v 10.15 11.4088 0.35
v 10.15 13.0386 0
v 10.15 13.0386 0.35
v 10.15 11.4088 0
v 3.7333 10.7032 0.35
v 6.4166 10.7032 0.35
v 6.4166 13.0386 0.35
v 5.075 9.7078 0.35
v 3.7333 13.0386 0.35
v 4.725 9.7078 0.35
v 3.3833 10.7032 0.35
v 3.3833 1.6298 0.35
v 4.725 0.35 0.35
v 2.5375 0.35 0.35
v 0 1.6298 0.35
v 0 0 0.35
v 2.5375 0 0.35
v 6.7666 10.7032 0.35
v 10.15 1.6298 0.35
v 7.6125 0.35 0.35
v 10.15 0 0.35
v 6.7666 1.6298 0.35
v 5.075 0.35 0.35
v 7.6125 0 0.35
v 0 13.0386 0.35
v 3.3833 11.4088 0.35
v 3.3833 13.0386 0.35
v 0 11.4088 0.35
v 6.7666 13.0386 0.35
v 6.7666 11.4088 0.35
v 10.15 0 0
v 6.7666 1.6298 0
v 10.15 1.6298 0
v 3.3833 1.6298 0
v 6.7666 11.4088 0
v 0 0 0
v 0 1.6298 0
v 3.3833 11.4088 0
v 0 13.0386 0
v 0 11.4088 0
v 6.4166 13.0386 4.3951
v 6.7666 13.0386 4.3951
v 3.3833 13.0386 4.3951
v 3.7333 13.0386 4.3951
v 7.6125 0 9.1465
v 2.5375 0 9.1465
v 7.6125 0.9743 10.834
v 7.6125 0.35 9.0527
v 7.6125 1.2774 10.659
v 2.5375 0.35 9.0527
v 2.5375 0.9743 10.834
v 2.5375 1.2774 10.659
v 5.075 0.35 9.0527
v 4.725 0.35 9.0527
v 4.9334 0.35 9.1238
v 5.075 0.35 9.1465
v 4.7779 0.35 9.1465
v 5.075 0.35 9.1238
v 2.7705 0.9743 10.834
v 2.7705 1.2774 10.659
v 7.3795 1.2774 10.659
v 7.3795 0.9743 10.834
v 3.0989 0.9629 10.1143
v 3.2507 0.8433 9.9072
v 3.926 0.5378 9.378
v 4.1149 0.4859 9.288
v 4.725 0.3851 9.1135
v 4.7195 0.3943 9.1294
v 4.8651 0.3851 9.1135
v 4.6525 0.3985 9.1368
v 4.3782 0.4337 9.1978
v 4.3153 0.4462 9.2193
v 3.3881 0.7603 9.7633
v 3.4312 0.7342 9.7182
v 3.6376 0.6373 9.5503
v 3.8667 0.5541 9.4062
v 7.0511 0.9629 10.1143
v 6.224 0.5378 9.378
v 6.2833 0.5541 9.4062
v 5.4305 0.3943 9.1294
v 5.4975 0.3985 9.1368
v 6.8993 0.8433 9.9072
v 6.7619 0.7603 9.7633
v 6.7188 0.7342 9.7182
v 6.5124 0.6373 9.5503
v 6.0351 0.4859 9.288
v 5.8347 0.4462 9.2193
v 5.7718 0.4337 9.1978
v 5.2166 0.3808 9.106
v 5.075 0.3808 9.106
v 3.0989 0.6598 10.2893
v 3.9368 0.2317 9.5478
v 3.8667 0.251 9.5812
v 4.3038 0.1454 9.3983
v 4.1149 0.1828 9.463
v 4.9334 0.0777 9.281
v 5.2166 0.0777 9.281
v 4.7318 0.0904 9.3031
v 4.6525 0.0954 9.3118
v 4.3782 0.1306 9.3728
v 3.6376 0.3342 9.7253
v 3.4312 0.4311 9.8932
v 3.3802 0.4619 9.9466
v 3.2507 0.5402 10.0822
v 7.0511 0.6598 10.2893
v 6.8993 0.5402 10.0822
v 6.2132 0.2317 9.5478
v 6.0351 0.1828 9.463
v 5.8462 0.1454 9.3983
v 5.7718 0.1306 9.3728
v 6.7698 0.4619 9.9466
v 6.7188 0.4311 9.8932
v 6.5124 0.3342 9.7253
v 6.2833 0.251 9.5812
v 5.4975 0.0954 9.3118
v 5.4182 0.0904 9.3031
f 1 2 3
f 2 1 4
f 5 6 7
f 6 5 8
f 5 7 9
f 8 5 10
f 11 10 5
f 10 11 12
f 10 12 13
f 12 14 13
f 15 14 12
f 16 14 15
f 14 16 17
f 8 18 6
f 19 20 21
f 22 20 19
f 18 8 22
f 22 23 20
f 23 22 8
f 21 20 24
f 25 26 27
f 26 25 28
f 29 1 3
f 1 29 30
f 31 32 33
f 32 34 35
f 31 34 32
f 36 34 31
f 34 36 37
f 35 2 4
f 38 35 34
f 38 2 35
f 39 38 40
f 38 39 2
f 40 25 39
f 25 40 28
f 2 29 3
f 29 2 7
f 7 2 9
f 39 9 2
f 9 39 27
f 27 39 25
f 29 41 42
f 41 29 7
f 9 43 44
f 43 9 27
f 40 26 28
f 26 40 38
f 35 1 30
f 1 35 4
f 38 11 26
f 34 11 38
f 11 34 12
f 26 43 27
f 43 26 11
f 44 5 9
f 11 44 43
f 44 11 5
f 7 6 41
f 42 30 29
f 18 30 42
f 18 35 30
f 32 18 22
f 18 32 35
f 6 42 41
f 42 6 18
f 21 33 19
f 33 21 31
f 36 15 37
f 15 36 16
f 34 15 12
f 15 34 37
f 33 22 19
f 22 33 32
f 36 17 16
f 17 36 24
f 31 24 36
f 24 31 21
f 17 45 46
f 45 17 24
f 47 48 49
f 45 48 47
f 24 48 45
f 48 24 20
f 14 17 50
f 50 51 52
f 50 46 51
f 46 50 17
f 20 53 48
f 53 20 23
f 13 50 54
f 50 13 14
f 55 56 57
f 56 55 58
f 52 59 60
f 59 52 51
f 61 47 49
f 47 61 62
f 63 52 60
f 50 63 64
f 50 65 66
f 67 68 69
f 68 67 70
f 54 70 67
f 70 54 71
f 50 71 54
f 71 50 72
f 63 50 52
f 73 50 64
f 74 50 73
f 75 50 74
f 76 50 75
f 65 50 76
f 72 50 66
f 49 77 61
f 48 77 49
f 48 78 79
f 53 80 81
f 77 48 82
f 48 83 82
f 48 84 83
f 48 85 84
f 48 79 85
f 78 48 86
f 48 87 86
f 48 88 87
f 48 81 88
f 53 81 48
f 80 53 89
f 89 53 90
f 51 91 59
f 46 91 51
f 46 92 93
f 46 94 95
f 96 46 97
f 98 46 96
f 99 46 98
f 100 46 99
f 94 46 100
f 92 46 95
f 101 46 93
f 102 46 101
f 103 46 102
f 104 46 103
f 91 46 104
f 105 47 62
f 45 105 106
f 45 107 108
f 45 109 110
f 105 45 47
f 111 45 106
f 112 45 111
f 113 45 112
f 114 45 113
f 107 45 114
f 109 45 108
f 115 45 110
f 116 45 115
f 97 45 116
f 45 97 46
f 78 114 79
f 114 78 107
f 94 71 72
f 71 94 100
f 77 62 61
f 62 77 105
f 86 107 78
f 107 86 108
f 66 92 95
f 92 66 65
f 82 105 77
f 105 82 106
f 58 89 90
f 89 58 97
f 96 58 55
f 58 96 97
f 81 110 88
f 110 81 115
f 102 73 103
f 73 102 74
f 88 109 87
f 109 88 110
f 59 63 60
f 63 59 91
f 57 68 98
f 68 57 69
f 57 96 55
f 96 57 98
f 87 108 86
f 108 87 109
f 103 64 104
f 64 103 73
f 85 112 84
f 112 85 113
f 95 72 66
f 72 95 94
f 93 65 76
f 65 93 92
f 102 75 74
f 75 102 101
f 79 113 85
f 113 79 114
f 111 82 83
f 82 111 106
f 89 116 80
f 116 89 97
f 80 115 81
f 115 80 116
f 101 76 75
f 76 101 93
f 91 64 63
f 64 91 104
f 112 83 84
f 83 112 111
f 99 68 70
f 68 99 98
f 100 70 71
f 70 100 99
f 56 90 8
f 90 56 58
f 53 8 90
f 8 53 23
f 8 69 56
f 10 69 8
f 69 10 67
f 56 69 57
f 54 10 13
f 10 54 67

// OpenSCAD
$fn = 50;

union() {
    translate([3.3833, 0, 0]) {
        cube([3.3833, 13.0386, 0.35]);
    };
    union() {
        translate([0, 11.4088, 0]) {
            cube([10.15, 1.6298, 0.35]);
        };
        translate([3.3833, 13.0386, 0]) {
            rotate([180, 270, 0]) {
                linear_extrude(height=0.35) {
                    polygon([[0, 0], [4.395078924206, 0], [0, 2.5375]]);
                };
            };
        };
        translate([6.4166, 13.0386, 0]) {
            rotate([180, 270, 0]) {
                linear_extrude(height=0.35) {
                    polygon([[0, 0], [4.395078924206, 0], [0, 2.5375]]);
                };
            };
        };
    };
    difference() {
        union() {
            cube([10.15, 1.6298, 0.35]);
            translate([2.5375, 0, 0]) {
                cube([5.075, 0.35, 9.1465]);
            };
            translate([2.5375, 0, 9.1465]) {
                rotate([-30, 0, 0]) {
                    cube([5.075, 0.35, 1.9486]);
                };
            };
        };
        hull() {
            translate([5.075, 3.1601103968574, 10.1001]) {
                rotate([60, 0, 0]) {
                    cylinder(h=8, r2=2.255, r1=2.255);
                };
            };
            translate([5.075, 3.1601103968574, 12.3501]) {
                rotate([60, 0, 0]) {
                    cylinder(h=8, r2=3.157, r1=3.157);
                };
            };
        };
    };
    translate([5.075, 0.35, 0.35]) {
        rotate([0, 270, 0]) {
            linear_extrude(height=0.35) {
                polygon([[0, 0], [8.7965, 0], [0, 9.3577842726502]]);
            };
        };
    };
};
